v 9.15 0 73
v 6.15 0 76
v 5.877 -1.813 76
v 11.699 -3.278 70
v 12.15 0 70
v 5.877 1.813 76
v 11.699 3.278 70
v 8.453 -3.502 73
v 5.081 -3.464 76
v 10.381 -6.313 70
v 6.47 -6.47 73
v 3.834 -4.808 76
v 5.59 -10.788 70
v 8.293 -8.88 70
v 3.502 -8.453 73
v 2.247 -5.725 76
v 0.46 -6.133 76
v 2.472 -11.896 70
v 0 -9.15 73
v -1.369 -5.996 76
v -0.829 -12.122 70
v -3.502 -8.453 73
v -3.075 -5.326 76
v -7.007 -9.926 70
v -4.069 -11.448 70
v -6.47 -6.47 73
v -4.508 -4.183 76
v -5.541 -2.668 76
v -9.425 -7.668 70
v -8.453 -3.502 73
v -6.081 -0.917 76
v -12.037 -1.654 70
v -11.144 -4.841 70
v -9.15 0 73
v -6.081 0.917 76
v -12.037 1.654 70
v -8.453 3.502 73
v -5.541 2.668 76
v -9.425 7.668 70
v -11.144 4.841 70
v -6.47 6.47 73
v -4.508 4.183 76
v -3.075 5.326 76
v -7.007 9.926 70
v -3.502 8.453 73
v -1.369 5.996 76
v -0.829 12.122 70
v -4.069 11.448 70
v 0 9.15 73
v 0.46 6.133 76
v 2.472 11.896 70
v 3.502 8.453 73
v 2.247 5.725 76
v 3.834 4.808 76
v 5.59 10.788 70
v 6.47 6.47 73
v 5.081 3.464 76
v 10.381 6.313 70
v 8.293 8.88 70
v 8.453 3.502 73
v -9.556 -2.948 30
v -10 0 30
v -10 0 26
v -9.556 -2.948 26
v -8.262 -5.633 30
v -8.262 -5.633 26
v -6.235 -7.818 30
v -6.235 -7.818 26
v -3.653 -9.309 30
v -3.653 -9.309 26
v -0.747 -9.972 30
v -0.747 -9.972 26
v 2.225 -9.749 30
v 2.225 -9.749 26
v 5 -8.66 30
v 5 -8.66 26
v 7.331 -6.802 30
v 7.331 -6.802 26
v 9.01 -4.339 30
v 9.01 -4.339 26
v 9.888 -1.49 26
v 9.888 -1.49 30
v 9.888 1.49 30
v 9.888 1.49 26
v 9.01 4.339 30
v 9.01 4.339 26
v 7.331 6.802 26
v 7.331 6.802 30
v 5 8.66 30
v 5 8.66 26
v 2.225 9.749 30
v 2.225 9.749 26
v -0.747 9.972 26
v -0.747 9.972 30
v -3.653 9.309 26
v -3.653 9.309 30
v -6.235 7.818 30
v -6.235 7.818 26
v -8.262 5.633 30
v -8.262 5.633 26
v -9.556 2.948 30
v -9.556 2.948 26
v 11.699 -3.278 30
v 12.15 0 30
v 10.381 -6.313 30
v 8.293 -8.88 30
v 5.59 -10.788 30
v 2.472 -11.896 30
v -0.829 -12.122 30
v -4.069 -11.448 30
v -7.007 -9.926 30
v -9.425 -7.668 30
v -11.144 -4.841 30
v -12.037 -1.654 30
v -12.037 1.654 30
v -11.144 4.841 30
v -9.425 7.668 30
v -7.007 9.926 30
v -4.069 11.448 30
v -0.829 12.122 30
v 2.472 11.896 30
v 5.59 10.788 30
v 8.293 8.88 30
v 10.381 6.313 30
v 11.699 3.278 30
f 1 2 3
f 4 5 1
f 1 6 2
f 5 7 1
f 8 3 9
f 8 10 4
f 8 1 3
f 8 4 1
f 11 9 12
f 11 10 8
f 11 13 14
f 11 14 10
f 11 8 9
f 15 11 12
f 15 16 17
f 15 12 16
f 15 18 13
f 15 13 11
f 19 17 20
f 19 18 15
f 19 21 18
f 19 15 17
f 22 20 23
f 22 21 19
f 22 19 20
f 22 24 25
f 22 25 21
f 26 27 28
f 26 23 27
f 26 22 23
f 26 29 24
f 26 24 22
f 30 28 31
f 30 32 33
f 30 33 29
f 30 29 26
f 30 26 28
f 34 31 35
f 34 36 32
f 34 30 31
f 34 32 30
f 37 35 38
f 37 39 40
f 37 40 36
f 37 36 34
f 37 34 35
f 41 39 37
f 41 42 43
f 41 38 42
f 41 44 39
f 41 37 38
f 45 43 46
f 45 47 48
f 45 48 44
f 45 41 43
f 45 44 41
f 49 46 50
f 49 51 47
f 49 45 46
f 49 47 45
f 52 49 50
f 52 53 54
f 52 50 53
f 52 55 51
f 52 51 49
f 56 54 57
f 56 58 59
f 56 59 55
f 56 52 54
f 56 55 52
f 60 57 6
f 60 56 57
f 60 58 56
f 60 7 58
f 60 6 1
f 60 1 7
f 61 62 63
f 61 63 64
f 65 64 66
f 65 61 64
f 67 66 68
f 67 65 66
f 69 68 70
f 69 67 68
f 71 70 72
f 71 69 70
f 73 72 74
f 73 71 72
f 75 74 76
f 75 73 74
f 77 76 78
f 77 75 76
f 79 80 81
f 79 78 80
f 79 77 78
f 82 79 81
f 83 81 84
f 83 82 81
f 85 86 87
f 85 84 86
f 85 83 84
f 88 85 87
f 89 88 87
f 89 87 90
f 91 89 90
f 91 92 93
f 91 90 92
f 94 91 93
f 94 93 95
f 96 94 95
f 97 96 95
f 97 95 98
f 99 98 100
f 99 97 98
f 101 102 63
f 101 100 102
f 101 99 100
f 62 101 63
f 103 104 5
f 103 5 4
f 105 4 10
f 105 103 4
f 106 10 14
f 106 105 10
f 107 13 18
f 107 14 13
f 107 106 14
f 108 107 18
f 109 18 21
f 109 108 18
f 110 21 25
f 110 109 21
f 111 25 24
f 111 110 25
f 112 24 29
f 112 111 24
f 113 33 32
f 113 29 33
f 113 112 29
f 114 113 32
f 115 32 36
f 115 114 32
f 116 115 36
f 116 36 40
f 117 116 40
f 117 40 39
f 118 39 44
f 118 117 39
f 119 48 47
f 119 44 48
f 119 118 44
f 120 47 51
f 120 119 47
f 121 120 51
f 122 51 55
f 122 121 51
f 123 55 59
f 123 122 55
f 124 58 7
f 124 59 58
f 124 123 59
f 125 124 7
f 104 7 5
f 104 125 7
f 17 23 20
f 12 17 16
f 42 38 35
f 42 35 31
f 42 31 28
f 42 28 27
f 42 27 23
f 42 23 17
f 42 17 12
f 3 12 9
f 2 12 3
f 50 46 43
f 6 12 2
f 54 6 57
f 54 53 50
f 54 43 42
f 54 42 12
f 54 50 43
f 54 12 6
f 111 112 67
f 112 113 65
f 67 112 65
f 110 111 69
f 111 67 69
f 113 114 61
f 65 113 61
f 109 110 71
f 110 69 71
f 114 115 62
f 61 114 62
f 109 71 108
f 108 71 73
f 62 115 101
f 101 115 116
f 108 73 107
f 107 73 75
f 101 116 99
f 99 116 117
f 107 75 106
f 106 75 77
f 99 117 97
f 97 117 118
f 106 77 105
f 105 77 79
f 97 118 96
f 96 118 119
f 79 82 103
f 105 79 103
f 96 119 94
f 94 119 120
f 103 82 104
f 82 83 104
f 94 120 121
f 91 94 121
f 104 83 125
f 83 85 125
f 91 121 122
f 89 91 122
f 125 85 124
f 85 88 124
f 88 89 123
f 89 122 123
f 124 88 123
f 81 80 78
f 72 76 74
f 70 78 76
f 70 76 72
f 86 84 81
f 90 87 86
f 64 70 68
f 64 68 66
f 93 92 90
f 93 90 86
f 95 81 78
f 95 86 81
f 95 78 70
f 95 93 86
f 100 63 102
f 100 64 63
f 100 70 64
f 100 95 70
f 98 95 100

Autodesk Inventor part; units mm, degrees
ref_plane "YZ Plane" through (0, 0, 0) normal (1, 0, 0) x (0, 1, 0)
ref_plane "XZ Plane" through (0, 0, 0) normal (0, 1, 0) x (-1, 0, 0)
ref_plane "XY Plane" through (0, 0, 0) normal (0, 0, 1) x (1, 0, 0)
ref_plane "Work Plane3" through (0, 0, 30) normal (0, 0, 1) x (1, 0, 0)
sketch "Sketch2" plane through (0, 0, 30) normal (0, 0, 1) x (1, 0, 0)
  circle A0 centre (0, 0) radius 12.15
  dimension "d12" = 24.3
extrude "Extrusion1" add sketch "Sketch2" along normal blind 46
chamfer "Chamfer2" distance 6 angle 45 1 edges at (-12.15, 0, 76)
sketch "Sketch3" plane through (0, 0, 30) normal (0, 0, -1) x (-1, 0, 0)
  circle A0 centre (0, 0) radius 12.15 projected
  circle A1 centre (0, 0) radius 10
  dimension "d9" = 20
extrude "Extrusion2" add sketch "Sketch3" along normal blind 4 contours A1
properties part number "00_Microscope_Objective"
